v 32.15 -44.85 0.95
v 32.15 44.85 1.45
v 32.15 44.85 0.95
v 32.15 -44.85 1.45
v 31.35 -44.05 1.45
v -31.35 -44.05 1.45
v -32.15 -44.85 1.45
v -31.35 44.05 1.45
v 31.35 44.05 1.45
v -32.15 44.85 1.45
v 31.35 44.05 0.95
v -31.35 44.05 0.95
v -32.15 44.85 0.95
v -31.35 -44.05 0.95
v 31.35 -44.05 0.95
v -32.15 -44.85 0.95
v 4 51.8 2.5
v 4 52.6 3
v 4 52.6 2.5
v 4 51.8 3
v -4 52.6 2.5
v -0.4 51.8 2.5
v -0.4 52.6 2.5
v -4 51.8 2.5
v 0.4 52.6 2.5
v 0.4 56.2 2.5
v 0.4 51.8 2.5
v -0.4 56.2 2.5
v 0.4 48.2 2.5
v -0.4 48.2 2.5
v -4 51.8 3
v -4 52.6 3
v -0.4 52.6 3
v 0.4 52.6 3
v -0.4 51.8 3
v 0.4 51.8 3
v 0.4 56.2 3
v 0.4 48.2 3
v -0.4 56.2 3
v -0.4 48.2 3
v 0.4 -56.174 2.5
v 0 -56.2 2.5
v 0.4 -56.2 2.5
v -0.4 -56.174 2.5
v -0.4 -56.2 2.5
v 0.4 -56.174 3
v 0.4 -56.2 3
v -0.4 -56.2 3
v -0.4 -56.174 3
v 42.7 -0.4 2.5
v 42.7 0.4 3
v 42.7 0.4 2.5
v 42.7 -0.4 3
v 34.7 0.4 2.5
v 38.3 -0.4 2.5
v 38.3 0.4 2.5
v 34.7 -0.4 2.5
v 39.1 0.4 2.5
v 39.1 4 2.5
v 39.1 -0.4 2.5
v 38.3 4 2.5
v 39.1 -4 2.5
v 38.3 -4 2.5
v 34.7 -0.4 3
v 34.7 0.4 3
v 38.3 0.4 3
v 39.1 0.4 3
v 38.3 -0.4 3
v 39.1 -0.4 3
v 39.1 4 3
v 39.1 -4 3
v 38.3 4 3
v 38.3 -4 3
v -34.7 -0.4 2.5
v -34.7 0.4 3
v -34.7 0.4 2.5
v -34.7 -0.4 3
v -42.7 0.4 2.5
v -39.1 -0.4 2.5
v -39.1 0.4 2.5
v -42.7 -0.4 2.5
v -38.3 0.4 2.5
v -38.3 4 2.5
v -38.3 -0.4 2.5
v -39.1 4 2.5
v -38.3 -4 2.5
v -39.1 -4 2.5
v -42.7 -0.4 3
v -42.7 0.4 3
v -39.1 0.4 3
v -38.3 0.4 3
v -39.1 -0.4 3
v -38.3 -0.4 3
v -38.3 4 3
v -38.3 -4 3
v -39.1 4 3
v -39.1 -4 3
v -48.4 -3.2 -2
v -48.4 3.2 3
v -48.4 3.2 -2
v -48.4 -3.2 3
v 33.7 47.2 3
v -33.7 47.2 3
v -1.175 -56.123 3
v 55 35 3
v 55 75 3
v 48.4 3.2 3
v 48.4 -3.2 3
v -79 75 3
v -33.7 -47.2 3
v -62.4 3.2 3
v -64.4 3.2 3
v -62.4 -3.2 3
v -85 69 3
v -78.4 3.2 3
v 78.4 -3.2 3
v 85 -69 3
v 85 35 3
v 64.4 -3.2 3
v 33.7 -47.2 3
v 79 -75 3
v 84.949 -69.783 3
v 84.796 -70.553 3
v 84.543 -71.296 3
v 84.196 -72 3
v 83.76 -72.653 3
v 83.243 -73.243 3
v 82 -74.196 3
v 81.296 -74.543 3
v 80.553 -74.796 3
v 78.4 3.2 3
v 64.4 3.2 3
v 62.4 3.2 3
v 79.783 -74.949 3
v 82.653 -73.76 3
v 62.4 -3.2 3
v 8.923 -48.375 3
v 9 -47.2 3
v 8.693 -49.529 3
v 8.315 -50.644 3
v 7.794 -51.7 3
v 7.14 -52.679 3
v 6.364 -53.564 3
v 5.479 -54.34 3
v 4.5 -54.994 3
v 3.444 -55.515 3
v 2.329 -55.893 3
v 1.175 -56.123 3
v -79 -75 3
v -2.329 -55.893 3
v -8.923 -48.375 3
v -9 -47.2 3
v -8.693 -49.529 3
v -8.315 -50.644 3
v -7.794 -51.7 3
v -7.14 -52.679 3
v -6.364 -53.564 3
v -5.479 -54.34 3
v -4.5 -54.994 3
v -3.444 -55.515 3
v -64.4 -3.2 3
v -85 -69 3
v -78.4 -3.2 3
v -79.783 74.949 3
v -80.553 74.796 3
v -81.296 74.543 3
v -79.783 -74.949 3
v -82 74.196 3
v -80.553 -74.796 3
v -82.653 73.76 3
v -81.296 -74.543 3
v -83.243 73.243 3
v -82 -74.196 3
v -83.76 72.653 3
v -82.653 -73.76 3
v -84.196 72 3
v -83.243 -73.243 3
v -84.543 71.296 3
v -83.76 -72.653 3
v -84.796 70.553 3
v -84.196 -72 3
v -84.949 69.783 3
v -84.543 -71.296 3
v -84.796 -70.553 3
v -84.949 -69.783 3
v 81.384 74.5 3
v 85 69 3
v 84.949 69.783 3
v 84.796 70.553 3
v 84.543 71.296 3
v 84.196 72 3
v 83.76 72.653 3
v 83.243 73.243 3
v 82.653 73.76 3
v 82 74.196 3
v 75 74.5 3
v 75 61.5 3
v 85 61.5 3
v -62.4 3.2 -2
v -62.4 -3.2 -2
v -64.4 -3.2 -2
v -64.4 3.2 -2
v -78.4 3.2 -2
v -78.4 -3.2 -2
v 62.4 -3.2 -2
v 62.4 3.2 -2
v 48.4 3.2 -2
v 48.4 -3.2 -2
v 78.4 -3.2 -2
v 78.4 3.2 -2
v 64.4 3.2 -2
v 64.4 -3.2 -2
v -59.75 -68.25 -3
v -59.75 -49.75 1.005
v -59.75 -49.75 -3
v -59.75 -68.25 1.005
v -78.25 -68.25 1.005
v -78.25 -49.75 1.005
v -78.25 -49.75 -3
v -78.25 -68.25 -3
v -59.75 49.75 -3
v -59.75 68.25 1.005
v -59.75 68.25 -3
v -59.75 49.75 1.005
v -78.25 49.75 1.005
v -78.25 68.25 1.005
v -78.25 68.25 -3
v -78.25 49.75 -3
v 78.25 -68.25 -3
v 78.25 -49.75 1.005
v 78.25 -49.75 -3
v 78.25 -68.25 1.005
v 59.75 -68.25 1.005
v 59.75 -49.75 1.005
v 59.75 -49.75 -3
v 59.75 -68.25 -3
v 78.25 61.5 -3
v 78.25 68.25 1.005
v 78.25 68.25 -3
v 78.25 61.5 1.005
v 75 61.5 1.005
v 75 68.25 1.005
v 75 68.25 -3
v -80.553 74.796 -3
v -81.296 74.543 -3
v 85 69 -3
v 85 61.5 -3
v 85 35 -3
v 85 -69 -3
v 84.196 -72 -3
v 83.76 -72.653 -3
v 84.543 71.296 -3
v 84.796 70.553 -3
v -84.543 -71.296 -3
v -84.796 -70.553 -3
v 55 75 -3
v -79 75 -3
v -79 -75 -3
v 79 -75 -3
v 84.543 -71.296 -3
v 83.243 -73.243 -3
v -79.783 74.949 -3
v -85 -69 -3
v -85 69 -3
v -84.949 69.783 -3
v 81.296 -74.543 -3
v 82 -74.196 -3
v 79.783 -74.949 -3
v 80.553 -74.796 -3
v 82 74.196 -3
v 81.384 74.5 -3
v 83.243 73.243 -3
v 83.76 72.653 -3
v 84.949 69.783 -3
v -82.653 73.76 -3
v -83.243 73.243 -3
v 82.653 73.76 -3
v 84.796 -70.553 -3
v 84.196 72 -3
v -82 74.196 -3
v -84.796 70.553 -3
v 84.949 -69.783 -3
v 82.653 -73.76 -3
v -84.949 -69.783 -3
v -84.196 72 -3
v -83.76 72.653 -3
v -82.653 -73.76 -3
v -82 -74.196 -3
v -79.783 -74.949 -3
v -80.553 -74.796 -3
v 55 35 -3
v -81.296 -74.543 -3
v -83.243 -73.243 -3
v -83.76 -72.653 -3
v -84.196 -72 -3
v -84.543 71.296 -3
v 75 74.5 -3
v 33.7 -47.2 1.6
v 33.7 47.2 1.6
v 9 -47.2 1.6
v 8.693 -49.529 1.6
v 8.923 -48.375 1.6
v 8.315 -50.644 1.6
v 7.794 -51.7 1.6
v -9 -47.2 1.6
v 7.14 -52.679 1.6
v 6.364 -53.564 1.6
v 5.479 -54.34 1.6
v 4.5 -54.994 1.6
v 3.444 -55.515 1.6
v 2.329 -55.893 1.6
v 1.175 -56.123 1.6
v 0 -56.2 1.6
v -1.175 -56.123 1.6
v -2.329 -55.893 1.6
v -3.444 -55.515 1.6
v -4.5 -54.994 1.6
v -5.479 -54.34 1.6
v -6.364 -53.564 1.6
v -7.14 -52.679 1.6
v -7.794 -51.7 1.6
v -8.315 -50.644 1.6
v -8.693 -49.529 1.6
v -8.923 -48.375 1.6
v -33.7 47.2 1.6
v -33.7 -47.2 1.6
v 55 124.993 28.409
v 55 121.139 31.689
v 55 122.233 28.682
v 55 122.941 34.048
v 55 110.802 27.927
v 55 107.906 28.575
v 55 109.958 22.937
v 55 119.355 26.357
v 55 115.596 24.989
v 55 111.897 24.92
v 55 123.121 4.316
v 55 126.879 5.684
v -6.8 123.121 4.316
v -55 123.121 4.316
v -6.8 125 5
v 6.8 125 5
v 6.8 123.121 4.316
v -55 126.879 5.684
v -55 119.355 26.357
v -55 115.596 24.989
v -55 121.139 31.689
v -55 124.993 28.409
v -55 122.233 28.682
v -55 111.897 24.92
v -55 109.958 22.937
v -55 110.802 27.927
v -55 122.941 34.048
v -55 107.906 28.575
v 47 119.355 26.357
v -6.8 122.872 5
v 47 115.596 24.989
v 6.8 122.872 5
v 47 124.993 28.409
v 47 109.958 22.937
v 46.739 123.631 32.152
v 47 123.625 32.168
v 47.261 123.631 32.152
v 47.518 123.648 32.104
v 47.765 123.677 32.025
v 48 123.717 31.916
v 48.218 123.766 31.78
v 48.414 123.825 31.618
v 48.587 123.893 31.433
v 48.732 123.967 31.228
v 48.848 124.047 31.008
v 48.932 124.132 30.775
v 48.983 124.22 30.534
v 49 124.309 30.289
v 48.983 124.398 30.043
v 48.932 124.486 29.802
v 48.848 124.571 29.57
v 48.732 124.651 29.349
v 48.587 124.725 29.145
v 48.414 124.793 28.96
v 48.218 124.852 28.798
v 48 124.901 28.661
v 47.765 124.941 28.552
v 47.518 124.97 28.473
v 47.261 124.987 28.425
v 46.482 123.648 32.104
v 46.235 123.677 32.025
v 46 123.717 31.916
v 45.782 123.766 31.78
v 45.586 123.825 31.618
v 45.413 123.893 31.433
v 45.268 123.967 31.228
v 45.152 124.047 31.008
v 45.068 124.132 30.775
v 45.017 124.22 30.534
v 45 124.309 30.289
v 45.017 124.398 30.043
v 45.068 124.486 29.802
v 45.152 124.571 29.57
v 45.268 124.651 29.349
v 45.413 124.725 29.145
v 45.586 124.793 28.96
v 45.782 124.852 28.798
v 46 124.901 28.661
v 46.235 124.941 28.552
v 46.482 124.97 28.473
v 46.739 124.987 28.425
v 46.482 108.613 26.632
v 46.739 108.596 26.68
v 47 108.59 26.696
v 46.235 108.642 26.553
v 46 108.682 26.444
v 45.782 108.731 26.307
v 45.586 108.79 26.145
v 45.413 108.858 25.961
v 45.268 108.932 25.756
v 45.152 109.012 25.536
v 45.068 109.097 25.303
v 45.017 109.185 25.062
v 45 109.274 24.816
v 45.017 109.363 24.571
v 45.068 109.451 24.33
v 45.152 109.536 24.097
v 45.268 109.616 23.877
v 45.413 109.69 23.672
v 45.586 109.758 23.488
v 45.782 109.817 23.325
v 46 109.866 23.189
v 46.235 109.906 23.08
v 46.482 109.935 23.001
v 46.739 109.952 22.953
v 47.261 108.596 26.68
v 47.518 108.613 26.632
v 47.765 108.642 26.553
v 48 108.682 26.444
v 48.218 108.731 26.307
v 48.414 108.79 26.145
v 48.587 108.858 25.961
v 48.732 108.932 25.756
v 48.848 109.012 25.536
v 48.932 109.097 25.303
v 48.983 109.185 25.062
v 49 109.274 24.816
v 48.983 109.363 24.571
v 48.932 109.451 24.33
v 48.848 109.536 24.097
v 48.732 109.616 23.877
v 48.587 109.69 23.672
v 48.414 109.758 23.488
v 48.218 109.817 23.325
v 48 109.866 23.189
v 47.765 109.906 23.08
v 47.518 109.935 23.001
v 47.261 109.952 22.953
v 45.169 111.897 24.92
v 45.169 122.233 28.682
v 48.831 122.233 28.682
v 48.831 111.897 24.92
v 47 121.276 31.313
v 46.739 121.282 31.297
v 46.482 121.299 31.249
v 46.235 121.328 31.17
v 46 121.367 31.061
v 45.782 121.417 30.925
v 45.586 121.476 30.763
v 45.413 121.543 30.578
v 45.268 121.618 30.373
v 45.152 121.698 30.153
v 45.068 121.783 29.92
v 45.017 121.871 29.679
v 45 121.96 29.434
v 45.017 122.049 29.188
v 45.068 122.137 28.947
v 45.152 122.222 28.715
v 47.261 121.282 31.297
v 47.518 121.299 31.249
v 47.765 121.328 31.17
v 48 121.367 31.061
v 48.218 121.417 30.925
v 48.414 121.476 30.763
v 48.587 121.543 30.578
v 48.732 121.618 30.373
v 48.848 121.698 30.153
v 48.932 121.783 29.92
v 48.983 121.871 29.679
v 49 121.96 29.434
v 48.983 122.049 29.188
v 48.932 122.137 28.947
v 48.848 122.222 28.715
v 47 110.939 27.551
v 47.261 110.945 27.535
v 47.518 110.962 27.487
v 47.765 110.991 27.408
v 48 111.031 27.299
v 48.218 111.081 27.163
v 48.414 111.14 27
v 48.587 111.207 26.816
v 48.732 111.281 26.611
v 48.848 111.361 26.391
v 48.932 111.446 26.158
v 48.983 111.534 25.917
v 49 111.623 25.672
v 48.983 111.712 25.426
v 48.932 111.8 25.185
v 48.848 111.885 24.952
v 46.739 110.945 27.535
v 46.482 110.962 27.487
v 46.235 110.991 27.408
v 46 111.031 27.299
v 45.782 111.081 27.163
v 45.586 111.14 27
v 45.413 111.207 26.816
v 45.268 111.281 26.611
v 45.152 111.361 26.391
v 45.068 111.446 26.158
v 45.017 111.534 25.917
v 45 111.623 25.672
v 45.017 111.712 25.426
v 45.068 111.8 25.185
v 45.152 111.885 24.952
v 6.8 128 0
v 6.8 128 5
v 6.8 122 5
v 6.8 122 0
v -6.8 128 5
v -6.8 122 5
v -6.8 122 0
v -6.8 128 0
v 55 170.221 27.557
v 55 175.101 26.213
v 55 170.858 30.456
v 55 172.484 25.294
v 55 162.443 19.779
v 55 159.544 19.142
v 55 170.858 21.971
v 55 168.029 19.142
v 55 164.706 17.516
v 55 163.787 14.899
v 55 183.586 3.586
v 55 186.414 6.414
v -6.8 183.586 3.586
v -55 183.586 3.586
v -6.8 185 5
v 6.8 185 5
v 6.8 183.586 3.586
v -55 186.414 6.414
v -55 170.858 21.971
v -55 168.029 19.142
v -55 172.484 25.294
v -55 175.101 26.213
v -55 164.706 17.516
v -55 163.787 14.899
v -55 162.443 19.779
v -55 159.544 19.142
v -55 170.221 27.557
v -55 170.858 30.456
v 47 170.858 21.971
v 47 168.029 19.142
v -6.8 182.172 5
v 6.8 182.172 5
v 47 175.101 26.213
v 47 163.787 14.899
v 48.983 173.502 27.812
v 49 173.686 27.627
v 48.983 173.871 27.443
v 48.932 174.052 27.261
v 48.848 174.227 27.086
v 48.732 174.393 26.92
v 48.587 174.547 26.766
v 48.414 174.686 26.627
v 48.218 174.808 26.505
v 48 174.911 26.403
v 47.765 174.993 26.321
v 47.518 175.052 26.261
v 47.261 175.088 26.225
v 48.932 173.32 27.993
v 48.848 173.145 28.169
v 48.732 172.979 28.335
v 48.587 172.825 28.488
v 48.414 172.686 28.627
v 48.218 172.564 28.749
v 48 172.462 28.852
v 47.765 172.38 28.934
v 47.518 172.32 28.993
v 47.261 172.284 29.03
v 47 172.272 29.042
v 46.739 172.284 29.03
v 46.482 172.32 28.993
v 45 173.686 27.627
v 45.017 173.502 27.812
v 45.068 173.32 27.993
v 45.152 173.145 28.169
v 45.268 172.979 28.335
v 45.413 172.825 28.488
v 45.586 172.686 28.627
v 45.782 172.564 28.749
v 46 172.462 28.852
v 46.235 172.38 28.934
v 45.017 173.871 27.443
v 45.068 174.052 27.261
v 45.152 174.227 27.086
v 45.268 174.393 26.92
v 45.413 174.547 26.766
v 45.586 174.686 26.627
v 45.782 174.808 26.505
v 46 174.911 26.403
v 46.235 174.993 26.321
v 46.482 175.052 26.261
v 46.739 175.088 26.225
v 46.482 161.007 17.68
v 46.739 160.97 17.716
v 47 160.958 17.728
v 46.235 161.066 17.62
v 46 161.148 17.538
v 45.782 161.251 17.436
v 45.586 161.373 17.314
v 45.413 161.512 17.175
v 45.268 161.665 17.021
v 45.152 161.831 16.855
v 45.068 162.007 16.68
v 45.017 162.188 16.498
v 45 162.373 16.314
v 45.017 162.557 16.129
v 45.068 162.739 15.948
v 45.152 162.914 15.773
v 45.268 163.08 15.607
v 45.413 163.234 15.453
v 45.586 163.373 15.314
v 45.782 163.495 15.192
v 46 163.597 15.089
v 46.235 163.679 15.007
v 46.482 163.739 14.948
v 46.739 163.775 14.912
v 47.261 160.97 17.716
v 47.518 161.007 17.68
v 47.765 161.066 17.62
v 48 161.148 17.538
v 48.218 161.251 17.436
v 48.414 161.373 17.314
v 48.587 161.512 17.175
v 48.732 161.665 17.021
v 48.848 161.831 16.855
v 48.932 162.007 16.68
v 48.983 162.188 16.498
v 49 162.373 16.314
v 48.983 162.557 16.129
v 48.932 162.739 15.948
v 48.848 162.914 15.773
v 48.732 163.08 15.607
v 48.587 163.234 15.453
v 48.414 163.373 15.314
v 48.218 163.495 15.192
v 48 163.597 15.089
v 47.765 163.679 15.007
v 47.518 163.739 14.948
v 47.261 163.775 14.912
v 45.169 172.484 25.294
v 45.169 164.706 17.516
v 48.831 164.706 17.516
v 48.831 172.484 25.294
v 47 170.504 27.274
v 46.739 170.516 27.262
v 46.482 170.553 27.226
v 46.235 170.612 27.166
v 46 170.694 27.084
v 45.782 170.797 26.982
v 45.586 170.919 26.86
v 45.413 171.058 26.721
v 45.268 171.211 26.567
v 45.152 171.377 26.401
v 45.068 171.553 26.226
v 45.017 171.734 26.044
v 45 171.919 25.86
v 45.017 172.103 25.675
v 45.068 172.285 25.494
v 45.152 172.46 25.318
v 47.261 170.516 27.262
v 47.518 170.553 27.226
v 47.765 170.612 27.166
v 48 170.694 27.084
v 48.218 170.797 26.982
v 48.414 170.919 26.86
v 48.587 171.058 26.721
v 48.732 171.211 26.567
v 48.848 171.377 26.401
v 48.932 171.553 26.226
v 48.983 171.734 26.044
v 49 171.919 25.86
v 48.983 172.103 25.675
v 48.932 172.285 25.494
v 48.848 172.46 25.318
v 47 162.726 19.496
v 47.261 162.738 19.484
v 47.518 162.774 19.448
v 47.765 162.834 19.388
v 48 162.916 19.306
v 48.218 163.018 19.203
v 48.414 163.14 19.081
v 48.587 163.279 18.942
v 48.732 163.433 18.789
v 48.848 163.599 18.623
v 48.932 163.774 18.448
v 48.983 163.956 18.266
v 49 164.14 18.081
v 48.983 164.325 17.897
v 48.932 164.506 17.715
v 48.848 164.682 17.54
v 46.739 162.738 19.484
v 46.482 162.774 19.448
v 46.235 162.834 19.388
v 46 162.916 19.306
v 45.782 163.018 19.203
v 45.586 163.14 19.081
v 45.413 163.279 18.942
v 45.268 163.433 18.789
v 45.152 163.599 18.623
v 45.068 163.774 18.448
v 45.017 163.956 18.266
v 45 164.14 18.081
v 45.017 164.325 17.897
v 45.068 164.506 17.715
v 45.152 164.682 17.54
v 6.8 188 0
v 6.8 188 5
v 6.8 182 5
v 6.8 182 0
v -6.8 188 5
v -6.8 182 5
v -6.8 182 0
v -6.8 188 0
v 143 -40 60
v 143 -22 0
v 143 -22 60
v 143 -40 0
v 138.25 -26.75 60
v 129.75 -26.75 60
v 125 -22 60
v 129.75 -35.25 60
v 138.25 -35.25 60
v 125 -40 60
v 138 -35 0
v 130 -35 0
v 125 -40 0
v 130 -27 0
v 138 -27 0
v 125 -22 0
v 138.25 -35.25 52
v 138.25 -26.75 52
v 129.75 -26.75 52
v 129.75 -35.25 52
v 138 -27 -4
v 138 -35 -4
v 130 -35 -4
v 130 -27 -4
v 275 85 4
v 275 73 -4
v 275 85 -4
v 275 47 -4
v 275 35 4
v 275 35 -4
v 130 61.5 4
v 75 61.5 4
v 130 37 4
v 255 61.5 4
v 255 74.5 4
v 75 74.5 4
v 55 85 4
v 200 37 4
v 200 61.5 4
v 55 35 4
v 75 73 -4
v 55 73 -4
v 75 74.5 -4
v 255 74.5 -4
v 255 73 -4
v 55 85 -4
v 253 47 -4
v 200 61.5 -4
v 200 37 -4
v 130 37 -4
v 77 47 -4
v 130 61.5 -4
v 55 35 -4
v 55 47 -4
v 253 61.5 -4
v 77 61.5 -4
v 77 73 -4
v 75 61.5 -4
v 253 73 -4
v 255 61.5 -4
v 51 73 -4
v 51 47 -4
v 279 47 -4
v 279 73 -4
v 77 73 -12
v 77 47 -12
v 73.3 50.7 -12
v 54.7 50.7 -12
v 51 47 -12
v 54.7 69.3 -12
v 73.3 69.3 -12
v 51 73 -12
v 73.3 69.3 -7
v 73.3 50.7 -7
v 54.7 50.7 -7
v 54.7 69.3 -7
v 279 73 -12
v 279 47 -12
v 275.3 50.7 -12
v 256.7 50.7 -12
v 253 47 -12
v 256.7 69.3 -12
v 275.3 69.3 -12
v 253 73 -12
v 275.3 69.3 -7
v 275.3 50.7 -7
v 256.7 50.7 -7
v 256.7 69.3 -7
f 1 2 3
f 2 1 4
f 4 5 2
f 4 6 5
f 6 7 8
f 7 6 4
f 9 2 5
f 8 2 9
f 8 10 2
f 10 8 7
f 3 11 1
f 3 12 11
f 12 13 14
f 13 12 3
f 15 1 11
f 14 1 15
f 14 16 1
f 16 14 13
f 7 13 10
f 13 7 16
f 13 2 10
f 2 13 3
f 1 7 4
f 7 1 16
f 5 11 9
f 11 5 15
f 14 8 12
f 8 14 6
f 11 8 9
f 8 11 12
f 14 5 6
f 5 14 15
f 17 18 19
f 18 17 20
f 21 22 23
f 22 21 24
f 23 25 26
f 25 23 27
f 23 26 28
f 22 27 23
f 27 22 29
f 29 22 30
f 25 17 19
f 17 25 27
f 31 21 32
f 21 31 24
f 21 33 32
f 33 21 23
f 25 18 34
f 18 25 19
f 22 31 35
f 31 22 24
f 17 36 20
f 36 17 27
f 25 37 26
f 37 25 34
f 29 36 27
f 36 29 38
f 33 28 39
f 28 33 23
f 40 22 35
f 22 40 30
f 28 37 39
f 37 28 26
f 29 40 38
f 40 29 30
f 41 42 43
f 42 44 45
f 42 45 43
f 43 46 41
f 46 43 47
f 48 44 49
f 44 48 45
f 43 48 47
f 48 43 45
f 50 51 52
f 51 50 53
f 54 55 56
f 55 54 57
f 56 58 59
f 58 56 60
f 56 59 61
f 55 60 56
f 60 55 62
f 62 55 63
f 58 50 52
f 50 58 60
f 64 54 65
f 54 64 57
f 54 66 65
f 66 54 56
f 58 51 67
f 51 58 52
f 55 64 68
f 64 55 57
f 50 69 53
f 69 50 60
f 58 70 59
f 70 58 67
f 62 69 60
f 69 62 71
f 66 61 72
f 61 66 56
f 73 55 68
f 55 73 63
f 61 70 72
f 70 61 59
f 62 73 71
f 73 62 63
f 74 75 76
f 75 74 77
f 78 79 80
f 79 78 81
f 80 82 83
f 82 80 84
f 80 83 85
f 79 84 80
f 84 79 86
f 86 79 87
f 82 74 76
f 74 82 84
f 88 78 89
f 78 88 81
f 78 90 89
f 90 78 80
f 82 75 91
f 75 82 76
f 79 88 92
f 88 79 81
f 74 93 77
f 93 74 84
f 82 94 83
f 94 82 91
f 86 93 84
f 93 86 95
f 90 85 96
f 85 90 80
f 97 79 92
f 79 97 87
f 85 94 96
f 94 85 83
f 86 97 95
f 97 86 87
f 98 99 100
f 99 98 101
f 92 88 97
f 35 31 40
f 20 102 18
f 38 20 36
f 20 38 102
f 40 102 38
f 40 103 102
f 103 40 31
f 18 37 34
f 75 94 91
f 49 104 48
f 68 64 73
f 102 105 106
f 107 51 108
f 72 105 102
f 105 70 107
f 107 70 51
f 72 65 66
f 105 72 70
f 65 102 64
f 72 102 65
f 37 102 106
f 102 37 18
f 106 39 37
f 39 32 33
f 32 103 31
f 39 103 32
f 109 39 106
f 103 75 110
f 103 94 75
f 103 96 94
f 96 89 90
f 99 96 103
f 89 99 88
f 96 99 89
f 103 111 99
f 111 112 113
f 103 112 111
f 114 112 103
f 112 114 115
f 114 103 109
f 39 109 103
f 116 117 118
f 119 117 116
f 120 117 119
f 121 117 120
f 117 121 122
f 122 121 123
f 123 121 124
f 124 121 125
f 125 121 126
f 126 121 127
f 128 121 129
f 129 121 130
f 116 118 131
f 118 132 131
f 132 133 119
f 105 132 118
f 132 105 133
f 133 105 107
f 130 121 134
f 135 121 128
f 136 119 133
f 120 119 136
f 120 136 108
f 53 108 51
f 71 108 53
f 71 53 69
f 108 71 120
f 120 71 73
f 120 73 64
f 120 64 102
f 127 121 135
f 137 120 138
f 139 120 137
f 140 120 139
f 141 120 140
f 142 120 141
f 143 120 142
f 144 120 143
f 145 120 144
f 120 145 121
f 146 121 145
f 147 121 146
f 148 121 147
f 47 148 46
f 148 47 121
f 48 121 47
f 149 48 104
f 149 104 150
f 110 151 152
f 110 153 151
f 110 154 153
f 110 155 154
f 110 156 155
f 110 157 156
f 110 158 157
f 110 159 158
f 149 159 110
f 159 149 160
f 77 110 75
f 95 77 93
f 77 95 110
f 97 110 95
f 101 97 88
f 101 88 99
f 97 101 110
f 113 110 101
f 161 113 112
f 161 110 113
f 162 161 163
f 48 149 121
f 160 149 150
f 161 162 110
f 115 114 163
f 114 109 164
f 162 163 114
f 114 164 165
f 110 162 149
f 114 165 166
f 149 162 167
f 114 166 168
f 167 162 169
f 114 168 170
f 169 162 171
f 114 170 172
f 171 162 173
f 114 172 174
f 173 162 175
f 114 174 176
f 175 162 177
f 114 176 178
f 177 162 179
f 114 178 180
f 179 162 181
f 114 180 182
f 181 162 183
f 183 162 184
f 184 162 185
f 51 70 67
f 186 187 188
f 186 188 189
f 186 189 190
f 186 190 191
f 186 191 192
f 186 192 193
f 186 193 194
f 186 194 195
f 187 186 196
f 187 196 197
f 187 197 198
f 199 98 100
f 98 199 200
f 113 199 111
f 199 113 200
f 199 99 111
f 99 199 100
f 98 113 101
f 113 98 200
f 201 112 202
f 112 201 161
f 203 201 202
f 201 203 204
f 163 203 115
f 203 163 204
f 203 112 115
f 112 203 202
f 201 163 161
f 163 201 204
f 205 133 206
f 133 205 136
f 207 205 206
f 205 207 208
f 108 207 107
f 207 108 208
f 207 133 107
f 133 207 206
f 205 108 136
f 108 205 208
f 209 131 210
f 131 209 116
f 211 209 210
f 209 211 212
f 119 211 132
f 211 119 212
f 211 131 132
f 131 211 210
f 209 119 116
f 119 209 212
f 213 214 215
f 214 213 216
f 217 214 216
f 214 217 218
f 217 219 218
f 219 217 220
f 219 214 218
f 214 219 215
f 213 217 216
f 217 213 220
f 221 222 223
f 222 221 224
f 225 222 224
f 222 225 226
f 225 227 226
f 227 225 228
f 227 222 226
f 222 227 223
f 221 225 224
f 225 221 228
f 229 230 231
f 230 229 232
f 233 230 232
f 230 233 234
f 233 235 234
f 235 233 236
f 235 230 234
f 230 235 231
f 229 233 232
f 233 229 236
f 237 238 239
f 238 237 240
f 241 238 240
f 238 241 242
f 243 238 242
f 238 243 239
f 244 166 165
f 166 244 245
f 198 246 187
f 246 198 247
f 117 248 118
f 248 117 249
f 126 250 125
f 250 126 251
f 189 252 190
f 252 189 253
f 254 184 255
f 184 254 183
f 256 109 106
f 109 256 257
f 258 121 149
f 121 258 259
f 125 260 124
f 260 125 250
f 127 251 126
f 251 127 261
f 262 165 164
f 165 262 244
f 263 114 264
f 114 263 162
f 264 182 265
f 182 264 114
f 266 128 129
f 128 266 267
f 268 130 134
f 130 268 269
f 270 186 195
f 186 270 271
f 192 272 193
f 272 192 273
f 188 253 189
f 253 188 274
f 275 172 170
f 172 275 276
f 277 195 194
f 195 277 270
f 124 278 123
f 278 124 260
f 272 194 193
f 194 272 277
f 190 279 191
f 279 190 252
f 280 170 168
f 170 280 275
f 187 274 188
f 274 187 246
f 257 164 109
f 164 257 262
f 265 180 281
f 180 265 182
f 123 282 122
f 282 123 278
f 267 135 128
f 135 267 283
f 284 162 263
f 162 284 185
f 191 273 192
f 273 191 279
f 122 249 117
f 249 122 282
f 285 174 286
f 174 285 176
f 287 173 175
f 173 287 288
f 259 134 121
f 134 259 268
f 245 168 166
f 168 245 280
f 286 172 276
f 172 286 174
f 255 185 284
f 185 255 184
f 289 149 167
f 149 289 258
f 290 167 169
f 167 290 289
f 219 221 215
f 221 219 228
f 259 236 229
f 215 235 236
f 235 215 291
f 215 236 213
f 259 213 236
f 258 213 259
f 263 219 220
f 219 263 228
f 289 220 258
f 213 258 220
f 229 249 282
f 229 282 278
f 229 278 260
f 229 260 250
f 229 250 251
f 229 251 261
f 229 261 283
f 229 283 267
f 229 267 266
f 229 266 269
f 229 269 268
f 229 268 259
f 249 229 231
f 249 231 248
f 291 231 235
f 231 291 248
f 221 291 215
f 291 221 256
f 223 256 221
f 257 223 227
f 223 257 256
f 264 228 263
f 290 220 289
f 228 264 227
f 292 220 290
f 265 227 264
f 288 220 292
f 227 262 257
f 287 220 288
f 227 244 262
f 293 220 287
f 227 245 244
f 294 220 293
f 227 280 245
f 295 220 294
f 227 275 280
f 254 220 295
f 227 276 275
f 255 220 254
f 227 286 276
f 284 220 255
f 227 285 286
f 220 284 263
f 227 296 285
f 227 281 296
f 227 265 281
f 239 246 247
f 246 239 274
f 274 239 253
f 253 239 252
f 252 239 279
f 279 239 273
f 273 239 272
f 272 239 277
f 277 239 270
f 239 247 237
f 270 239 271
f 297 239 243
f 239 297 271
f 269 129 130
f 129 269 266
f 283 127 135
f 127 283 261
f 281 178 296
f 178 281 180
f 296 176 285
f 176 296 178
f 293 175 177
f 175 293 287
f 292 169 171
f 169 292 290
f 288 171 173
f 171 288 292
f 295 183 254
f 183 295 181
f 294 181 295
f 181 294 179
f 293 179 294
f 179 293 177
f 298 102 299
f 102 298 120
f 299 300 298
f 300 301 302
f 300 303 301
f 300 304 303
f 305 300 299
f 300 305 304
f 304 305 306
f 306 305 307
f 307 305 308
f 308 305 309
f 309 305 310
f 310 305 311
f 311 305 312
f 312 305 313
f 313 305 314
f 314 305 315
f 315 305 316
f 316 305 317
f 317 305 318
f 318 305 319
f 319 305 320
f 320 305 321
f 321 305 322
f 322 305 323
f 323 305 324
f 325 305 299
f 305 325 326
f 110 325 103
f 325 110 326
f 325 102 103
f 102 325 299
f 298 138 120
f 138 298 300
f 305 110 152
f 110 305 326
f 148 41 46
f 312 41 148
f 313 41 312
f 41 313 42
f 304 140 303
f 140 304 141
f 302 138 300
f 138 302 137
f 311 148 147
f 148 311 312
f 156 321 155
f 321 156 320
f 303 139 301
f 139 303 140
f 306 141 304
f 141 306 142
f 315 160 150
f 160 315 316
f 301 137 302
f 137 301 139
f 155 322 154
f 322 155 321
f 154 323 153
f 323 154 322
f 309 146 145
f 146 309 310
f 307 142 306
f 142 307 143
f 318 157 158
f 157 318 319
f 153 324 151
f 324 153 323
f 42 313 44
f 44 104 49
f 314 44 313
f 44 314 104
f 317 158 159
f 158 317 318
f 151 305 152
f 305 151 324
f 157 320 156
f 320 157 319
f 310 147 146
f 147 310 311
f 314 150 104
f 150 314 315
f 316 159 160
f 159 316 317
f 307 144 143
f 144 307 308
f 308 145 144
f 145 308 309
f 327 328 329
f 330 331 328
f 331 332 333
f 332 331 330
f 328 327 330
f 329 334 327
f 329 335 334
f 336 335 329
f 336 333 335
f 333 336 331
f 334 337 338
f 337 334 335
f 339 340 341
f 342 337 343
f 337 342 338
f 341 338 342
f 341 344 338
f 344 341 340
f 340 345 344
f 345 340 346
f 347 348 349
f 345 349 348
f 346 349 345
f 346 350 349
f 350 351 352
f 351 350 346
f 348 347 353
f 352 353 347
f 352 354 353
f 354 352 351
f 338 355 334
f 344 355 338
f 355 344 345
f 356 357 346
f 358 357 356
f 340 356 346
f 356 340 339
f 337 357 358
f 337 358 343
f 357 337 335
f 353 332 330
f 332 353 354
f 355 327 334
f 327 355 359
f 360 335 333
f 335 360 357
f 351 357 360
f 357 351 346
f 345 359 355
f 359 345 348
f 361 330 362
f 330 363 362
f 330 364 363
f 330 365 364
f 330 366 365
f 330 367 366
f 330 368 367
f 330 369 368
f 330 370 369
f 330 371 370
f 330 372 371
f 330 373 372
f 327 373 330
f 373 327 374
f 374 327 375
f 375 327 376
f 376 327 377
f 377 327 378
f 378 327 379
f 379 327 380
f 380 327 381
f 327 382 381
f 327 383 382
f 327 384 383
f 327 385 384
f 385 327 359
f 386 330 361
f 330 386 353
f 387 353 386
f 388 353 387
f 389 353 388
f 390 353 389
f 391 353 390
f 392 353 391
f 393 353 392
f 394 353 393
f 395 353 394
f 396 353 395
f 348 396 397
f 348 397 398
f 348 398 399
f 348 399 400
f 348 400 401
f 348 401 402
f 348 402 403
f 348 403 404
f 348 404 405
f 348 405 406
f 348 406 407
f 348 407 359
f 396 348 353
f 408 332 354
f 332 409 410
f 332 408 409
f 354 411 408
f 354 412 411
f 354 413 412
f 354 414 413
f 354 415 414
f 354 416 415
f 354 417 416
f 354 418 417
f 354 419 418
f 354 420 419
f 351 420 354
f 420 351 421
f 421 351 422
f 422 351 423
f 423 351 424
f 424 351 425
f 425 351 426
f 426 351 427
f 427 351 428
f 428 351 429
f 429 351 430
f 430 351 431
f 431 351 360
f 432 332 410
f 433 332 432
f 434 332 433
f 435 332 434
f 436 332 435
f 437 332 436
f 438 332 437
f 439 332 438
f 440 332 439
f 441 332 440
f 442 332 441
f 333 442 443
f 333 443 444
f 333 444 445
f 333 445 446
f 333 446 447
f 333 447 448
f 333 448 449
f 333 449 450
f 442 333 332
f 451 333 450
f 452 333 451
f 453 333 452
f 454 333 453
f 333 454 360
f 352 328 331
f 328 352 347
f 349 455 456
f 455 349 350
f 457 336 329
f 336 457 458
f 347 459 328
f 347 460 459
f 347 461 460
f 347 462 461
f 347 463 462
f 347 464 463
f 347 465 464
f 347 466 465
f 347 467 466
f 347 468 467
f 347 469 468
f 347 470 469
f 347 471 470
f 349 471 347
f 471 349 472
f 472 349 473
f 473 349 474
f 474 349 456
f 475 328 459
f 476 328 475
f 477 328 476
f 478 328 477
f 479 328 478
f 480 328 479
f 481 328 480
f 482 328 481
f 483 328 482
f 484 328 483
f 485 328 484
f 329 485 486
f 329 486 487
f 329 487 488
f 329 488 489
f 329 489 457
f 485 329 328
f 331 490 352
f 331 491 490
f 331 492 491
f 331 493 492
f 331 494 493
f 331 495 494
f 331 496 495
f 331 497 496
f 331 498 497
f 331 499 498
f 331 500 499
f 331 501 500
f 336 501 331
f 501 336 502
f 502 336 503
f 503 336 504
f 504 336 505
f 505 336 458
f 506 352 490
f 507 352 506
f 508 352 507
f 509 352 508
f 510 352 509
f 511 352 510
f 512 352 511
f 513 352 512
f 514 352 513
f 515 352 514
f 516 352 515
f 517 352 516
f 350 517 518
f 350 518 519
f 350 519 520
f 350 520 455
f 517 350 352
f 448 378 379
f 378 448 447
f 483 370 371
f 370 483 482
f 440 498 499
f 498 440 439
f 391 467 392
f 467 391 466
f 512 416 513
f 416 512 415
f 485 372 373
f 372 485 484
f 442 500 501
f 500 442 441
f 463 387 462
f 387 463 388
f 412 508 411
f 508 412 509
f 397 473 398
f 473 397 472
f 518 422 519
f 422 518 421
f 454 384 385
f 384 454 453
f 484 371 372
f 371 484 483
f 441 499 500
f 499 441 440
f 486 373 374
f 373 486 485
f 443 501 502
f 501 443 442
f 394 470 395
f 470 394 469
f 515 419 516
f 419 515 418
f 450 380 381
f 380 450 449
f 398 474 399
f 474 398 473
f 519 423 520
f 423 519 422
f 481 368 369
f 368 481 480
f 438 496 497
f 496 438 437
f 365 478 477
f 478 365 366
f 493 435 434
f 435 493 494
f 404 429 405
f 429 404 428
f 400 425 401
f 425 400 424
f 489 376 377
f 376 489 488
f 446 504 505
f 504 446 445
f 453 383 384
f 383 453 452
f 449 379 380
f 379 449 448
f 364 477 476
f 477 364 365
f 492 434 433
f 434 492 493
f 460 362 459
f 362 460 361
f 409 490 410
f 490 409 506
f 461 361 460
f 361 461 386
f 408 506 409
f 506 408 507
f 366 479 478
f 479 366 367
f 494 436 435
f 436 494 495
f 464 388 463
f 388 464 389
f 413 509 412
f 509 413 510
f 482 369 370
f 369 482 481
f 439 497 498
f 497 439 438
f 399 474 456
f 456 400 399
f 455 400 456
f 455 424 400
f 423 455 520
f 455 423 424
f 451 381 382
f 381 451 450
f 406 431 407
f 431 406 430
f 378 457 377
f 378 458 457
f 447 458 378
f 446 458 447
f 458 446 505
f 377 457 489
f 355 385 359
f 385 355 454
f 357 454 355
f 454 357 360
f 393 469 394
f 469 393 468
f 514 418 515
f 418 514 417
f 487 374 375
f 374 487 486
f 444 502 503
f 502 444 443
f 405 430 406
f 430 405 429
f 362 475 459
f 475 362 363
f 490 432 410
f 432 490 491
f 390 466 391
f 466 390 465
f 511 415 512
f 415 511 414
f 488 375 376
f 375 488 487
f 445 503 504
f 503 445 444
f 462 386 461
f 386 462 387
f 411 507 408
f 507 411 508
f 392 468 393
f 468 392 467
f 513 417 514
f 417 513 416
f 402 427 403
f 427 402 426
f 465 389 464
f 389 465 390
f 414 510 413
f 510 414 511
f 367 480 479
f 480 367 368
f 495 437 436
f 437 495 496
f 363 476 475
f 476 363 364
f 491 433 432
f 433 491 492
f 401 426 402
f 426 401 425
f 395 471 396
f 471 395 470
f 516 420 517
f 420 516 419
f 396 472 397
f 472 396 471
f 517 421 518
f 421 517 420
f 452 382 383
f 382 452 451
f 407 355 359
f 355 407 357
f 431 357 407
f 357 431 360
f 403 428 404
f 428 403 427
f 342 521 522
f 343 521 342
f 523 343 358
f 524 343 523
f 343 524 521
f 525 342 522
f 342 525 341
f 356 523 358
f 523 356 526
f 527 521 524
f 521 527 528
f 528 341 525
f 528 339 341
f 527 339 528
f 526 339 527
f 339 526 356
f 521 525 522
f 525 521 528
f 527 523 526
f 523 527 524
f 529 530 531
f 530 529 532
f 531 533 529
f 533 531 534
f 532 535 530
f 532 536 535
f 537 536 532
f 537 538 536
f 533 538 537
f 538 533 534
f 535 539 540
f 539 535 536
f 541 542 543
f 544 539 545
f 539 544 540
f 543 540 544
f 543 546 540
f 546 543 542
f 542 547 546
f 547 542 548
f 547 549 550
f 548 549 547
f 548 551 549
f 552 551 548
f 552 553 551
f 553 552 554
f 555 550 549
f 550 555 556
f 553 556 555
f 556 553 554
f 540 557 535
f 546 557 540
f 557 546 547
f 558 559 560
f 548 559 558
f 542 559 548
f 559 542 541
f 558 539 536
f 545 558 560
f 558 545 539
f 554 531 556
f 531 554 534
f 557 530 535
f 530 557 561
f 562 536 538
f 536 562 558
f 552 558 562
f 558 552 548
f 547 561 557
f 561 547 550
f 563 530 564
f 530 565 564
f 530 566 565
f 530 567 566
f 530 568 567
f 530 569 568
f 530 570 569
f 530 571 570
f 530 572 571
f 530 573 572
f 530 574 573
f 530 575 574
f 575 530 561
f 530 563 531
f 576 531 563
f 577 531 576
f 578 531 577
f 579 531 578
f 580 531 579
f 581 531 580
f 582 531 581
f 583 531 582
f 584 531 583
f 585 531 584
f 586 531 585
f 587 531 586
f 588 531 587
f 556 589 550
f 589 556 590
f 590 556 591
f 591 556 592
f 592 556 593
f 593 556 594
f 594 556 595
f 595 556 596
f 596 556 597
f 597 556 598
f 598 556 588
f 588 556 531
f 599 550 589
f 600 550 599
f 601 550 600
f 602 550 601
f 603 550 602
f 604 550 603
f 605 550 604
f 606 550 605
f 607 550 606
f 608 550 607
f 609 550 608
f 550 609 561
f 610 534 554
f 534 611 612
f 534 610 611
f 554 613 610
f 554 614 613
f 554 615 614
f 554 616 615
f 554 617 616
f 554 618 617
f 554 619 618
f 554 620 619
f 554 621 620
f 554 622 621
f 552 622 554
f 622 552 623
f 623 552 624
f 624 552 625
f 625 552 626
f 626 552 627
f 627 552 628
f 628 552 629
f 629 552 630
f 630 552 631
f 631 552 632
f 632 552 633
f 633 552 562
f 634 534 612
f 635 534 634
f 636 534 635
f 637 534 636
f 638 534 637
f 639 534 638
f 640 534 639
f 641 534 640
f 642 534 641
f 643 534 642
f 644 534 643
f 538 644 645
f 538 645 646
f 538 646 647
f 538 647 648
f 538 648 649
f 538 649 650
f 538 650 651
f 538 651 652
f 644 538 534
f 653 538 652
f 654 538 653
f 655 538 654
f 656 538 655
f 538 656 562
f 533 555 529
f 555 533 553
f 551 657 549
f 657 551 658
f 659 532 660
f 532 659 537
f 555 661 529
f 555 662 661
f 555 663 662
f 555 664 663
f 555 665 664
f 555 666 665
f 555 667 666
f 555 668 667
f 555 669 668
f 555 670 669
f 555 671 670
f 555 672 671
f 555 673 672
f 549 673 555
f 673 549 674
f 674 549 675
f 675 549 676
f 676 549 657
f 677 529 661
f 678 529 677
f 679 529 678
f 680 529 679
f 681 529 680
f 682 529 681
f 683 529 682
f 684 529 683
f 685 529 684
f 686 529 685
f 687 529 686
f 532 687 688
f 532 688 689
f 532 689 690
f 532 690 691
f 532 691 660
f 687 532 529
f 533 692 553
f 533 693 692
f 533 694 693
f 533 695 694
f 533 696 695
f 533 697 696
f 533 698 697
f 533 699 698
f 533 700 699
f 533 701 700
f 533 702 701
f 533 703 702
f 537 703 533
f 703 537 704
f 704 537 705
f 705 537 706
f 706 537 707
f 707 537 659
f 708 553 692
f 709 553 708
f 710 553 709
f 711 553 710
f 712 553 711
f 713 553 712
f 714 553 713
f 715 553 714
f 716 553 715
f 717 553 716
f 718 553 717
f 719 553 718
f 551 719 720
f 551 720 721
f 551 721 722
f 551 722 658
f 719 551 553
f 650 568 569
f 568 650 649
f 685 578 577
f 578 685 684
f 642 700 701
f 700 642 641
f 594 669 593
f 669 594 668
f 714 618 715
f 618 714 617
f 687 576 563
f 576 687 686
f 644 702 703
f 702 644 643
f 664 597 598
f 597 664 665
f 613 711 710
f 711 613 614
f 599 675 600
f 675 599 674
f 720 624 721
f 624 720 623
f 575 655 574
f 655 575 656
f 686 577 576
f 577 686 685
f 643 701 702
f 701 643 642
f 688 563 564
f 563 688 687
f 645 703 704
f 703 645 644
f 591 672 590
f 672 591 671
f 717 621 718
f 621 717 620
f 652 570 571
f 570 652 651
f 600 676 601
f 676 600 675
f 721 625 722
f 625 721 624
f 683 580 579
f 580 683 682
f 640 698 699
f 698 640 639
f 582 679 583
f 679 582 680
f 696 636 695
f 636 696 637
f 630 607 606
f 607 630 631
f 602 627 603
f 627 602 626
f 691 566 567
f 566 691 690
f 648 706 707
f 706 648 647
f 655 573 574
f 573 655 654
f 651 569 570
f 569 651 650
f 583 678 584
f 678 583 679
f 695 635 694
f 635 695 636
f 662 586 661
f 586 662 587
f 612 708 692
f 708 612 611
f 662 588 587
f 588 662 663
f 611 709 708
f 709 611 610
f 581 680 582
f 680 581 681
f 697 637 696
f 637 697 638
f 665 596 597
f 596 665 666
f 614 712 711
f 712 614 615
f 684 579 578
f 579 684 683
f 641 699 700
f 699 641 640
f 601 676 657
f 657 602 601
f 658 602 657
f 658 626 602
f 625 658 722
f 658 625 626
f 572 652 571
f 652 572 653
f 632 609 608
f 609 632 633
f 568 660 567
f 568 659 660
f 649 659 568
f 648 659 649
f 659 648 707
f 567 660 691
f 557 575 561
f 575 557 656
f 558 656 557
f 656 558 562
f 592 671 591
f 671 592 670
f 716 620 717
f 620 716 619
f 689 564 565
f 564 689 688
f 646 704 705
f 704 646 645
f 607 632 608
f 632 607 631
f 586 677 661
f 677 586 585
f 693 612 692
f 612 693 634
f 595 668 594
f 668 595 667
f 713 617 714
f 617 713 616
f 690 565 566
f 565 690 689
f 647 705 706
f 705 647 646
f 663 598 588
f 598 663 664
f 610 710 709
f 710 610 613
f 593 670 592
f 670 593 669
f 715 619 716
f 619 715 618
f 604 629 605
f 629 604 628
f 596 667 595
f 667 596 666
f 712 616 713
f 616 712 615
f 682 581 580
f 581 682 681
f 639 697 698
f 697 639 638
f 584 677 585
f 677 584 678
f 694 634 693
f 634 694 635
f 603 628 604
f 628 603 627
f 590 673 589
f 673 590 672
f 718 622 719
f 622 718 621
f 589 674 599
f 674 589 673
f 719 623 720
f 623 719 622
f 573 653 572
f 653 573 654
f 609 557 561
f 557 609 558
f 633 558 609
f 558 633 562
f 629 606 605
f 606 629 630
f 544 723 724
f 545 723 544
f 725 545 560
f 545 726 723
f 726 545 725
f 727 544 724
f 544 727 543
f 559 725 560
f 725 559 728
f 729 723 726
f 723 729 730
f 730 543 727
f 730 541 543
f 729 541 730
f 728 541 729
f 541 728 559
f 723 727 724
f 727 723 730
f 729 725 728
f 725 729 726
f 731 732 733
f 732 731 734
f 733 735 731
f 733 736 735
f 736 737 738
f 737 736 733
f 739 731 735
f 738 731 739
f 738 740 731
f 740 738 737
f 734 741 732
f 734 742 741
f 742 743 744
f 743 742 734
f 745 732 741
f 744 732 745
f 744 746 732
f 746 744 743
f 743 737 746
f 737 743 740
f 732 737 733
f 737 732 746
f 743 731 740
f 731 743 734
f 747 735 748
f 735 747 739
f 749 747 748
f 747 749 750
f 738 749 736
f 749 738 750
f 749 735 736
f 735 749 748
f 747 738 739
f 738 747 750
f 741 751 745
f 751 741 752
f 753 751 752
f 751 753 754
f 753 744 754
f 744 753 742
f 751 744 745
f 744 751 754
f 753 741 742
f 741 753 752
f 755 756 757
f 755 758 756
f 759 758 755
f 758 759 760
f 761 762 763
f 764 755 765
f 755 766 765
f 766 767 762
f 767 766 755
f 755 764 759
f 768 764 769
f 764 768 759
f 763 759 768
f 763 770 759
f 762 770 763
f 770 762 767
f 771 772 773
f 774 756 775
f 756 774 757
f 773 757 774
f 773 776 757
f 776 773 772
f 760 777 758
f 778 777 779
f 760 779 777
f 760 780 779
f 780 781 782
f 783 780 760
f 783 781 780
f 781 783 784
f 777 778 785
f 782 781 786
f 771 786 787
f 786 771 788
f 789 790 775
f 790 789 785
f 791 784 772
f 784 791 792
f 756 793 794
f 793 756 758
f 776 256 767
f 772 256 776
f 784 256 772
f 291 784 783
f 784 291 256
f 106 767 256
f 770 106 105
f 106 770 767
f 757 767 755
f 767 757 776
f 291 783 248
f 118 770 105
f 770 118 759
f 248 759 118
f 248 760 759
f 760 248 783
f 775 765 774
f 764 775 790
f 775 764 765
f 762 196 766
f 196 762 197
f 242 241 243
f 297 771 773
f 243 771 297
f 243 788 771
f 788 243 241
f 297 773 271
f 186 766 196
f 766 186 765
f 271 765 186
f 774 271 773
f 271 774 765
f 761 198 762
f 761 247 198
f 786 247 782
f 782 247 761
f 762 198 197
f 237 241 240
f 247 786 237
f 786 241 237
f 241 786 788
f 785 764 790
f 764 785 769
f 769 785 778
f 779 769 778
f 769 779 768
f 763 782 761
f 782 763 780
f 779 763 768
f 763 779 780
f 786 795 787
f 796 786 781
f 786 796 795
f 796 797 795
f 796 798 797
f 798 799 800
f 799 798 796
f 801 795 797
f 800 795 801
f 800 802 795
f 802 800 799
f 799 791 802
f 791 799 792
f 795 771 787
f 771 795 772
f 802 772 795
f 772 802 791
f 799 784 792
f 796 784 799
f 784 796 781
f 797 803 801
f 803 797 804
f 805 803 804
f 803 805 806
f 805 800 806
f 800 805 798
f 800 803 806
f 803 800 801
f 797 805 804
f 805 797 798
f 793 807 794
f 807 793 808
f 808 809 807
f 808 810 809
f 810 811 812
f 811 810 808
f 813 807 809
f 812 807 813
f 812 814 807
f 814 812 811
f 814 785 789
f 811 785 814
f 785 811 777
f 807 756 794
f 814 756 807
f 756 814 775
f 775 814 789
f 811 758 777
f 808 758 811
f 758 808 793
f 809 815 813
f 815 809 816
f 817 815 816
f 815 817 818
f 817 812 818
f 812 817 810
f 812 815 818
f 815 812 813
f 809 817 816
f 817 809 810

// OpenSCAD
// ============================================================================
// GradeStage — card imaging & pre-grading rig                © 2026 DarkHearts
// ============================================================================
// Parametric OpenSCAD. Print parts on any 180x180mm+ bed in PLA/PETG.
// Open in OpenSCAD (free, openscad.org) → set `part` below → F6 → Export STL.
//
// PARTS
//   "base"    — the stage: recessed card bay (raw card, penny sleeve, or
//               Card Saver 1), engraved centering crosshairs, LED-bar sockets
//               at 20° (raking — reveals print lines/scratches) and 45°
//               (even illumination — color/centering shots), rubber-foot dimples.
//   "ledbar"  — snap-in bar holding a 10mm COB/strip LED segment (print 2).
//   "column"  — stackable tower column (print 4 for ~240mm camera height).
//   "bridge"  — phone crossbar that sits on two column stacks; slot keeps the
//               phone camera centered over the card bay.
//   "all"     — plated layout preview.
// ============================================================================

part = "all"; // ["base","ledbar","column","bridge","all"]

/* ------------------------------- core dims ------------------------------- */
card_w      = 63.5;   // raw card
card_h      = 88.9;
saver_w     = 66.8;   // Card Saver 1 envelope (graded-prep standard)
saver_h     = 93.8;
bay_tol     = 0.6;    // fit clearance
bay_depth   = 1.4;    // shallow so raking light grazes the surface

base_w      = 170;
base_d      = 150;
base_t      = 6;

led_len     = 110;    // LED strip segment length the bar carries
led_w       = 11;     // strip width (10mm COB + clearance)
bar_t       = 3;

rake_angle  = 20;     // raking light angle (surface-defect hunting)
even_angle  = 45;     // even-light angle (color & centering shots)

col_w       = 18;     // tower column square section
col_h       = 60;     // per-section height (stack 4 = 240mm lens height)
peg         = 8;      // stacking peg
bridge_len  = 220;    // spans the stage
phone_slot  = 13;     // fits phones up to ~12.5mm thick w/ case

$fn = 48;

/* --------------------------------- base ---------------------------------- */
module crosshair(l = 8, t = 0.8, depth = 0.5) {
  translate([-l/2, -t/2, -depth]) cube([l, t, depth + 0.01]);
  translate([-t/2, -l/2, -depth]) cube([t, l, depth + 0.01]);
}

module led_socket() {
  // dovetail-ish slot pair a led-bar tongue drops into
  cube([14, 6.4, 5], center = true);
}

module base() {
  difference() {
    // plate with rounded corners
    minkowski() {
      cube([base_w - 12, base_d - 12, base_t - 1], center = true);
      cylinder(r = 6, h = 1, center = true);
    }
    // card bay — sized for Card Saver 1; engraved inner outline marks raw card
    translate([0, 0, base_t/2 - bay_depth/2 + 0.01])
      cube([saver_w + bay_tol, saver_h + bay_tol, bay_depth + 0.02], center = true);
    // raw-card outline engraving inside the bay floor
    translate([0, 0, base_t/2 - bay_depth - 0.4]) difference() {
      cube([card_w + 0.8, card_h + 0.8, 0.5], center = true);
      cube([card_w - 0.8, card_h - 0.8, 0.6], center = true);
    }
    // centering crosshairs at bay mid-edges (line phone gridlines up to these)
    for (p = [[0,  (saver_h + bay_tol)/2 + 5], [0, -(saver_h + bay_tol)/2 - 5]])
      translate([p[0], p[1], base_t/2]) crosshair();
    for (p = [[ (saver_w + bay_tol)/2 + 5, 0], [-(saver_w + bay_tol)/2 - 5, 0]])
      translate([p[0], p[1], base_t/2]) crosshair();
    // finger notch to lift the card
    translate([0, -(saver_h + bay_tol)/2, base_t/2 - bay_depth])
      cylinder(d = 18, h = bay_depth + 0.01);
    // LED-bar sockets: one pair per side per angle (marked R=raking, E=even)
    for (s = [-1, 1]) {
      translate([s * (saver_w/2 + 22), 0, base_t/2 - 2.5]) led_socket();          // raking
      translate([s * (saver_w/2 + 38), 0, base_t/2 - 2.5]) led_socket();          // even
    }
    // tower column sockets (rear corners + front corners)
    for (x = [-1, 1], y = [-1, 1])
      translate([x * (base_w/2 - 16), y * (base_d/2 - 16), base_t/2 - 4])
        cube([col_w + 0.5, col_w + 0.5, 4.01], center = true);
    // rubber-foot dimples
    for (x = [-1, 1], y = [-1, 1])
      translate([x * (base_w/2 - 12), y * (base_d/2 - 12), -base_t/2])
        cylinder(d = 8, h = 1);
  }
}

/* -------------------------------- led bar -------------------------------- */
module ledbar(angle = rake_angle) {
  // tongue that drops into a base socket
  translate([0, 0, 2.5]) cube([13.6, 6, 5], center = true);
  // angled mast + channel for the LED strip, wire exit at one end
  translate([0, 0, 5]) rotate([angle, 0, 0]) difference() {
    union() {
      translate([-led_len/2, -2, 0]) cube([led_len, 4, 26]);
      translate([-led_len/2, -8, 22]) cube([led_len, 16, 6]);  // strip shelf
    }
    translate([-led_len/2 - 0.01, -led_w/2, 23.2]) cube([led_len + 0.02, led_w, 3.2]);
    translate([led_len/2 - 8, 0, 24]) rotate([90, 0, 0]) cylinder(d = 4, h = 20, center = true); // wire exit
  }
}

/* --------------------------------- tower --------------------------------- */
module column() {
  difference() {
    cube([col_w, col_w, col_h], center = false);
    translate([col_w/2, col_w/2, col_h - peg/2 + 0.01])
      cube([peg + 0.5, peg + 0.5, peg + 0.02], center = true);  // top socket
  }
  translate([col_w/2, col_w/2, 0])
    cube([peg, peg, peg], center = true); // bottom peg (4mm proud) mates next section / base socket
}

module bridge() {
  difference() {
    cube([bridge_len, 50, 8], center = true);
    // phone slot with camera window
    translate([0, 8, 0]) cube([bridge_len - 40, phone_slot, 8.01], center = true);
    translate([0, -10, 0]) cube([70, 26, 8.01], center = true); // camera window over the bay
  }
  // end caps that seat on column stacks
  for (s = [-1, 1]) translate([s * (bridge_len/2 - col_w/2), 0, -8]) difference() {
    cube([col_w + 8, col_w + 8, 8], center = true);
    translate([0, 0, -2]) cube([col_w + 0.6, col_w + 0.6, 6], center = true);
  }
}

/* --------------------------------- plate --------------------------------- */
if (part == "base") base();
if (part == "ledbar") ledbar();
if (part == "column") column();
if (part == "bridge") bridge();
if (part == "all") {
  base();
  translate([0, base_d/2 + 50, 0]) ledbar(rake_angle);
  translate([0, base_d/2 + 110, 0]) ledbar(even_angle);
  translate([base_w/2 + 40, -40, 0]) column();
  translate([base_w/2 + 80, 60, 0]) bridge();
}
